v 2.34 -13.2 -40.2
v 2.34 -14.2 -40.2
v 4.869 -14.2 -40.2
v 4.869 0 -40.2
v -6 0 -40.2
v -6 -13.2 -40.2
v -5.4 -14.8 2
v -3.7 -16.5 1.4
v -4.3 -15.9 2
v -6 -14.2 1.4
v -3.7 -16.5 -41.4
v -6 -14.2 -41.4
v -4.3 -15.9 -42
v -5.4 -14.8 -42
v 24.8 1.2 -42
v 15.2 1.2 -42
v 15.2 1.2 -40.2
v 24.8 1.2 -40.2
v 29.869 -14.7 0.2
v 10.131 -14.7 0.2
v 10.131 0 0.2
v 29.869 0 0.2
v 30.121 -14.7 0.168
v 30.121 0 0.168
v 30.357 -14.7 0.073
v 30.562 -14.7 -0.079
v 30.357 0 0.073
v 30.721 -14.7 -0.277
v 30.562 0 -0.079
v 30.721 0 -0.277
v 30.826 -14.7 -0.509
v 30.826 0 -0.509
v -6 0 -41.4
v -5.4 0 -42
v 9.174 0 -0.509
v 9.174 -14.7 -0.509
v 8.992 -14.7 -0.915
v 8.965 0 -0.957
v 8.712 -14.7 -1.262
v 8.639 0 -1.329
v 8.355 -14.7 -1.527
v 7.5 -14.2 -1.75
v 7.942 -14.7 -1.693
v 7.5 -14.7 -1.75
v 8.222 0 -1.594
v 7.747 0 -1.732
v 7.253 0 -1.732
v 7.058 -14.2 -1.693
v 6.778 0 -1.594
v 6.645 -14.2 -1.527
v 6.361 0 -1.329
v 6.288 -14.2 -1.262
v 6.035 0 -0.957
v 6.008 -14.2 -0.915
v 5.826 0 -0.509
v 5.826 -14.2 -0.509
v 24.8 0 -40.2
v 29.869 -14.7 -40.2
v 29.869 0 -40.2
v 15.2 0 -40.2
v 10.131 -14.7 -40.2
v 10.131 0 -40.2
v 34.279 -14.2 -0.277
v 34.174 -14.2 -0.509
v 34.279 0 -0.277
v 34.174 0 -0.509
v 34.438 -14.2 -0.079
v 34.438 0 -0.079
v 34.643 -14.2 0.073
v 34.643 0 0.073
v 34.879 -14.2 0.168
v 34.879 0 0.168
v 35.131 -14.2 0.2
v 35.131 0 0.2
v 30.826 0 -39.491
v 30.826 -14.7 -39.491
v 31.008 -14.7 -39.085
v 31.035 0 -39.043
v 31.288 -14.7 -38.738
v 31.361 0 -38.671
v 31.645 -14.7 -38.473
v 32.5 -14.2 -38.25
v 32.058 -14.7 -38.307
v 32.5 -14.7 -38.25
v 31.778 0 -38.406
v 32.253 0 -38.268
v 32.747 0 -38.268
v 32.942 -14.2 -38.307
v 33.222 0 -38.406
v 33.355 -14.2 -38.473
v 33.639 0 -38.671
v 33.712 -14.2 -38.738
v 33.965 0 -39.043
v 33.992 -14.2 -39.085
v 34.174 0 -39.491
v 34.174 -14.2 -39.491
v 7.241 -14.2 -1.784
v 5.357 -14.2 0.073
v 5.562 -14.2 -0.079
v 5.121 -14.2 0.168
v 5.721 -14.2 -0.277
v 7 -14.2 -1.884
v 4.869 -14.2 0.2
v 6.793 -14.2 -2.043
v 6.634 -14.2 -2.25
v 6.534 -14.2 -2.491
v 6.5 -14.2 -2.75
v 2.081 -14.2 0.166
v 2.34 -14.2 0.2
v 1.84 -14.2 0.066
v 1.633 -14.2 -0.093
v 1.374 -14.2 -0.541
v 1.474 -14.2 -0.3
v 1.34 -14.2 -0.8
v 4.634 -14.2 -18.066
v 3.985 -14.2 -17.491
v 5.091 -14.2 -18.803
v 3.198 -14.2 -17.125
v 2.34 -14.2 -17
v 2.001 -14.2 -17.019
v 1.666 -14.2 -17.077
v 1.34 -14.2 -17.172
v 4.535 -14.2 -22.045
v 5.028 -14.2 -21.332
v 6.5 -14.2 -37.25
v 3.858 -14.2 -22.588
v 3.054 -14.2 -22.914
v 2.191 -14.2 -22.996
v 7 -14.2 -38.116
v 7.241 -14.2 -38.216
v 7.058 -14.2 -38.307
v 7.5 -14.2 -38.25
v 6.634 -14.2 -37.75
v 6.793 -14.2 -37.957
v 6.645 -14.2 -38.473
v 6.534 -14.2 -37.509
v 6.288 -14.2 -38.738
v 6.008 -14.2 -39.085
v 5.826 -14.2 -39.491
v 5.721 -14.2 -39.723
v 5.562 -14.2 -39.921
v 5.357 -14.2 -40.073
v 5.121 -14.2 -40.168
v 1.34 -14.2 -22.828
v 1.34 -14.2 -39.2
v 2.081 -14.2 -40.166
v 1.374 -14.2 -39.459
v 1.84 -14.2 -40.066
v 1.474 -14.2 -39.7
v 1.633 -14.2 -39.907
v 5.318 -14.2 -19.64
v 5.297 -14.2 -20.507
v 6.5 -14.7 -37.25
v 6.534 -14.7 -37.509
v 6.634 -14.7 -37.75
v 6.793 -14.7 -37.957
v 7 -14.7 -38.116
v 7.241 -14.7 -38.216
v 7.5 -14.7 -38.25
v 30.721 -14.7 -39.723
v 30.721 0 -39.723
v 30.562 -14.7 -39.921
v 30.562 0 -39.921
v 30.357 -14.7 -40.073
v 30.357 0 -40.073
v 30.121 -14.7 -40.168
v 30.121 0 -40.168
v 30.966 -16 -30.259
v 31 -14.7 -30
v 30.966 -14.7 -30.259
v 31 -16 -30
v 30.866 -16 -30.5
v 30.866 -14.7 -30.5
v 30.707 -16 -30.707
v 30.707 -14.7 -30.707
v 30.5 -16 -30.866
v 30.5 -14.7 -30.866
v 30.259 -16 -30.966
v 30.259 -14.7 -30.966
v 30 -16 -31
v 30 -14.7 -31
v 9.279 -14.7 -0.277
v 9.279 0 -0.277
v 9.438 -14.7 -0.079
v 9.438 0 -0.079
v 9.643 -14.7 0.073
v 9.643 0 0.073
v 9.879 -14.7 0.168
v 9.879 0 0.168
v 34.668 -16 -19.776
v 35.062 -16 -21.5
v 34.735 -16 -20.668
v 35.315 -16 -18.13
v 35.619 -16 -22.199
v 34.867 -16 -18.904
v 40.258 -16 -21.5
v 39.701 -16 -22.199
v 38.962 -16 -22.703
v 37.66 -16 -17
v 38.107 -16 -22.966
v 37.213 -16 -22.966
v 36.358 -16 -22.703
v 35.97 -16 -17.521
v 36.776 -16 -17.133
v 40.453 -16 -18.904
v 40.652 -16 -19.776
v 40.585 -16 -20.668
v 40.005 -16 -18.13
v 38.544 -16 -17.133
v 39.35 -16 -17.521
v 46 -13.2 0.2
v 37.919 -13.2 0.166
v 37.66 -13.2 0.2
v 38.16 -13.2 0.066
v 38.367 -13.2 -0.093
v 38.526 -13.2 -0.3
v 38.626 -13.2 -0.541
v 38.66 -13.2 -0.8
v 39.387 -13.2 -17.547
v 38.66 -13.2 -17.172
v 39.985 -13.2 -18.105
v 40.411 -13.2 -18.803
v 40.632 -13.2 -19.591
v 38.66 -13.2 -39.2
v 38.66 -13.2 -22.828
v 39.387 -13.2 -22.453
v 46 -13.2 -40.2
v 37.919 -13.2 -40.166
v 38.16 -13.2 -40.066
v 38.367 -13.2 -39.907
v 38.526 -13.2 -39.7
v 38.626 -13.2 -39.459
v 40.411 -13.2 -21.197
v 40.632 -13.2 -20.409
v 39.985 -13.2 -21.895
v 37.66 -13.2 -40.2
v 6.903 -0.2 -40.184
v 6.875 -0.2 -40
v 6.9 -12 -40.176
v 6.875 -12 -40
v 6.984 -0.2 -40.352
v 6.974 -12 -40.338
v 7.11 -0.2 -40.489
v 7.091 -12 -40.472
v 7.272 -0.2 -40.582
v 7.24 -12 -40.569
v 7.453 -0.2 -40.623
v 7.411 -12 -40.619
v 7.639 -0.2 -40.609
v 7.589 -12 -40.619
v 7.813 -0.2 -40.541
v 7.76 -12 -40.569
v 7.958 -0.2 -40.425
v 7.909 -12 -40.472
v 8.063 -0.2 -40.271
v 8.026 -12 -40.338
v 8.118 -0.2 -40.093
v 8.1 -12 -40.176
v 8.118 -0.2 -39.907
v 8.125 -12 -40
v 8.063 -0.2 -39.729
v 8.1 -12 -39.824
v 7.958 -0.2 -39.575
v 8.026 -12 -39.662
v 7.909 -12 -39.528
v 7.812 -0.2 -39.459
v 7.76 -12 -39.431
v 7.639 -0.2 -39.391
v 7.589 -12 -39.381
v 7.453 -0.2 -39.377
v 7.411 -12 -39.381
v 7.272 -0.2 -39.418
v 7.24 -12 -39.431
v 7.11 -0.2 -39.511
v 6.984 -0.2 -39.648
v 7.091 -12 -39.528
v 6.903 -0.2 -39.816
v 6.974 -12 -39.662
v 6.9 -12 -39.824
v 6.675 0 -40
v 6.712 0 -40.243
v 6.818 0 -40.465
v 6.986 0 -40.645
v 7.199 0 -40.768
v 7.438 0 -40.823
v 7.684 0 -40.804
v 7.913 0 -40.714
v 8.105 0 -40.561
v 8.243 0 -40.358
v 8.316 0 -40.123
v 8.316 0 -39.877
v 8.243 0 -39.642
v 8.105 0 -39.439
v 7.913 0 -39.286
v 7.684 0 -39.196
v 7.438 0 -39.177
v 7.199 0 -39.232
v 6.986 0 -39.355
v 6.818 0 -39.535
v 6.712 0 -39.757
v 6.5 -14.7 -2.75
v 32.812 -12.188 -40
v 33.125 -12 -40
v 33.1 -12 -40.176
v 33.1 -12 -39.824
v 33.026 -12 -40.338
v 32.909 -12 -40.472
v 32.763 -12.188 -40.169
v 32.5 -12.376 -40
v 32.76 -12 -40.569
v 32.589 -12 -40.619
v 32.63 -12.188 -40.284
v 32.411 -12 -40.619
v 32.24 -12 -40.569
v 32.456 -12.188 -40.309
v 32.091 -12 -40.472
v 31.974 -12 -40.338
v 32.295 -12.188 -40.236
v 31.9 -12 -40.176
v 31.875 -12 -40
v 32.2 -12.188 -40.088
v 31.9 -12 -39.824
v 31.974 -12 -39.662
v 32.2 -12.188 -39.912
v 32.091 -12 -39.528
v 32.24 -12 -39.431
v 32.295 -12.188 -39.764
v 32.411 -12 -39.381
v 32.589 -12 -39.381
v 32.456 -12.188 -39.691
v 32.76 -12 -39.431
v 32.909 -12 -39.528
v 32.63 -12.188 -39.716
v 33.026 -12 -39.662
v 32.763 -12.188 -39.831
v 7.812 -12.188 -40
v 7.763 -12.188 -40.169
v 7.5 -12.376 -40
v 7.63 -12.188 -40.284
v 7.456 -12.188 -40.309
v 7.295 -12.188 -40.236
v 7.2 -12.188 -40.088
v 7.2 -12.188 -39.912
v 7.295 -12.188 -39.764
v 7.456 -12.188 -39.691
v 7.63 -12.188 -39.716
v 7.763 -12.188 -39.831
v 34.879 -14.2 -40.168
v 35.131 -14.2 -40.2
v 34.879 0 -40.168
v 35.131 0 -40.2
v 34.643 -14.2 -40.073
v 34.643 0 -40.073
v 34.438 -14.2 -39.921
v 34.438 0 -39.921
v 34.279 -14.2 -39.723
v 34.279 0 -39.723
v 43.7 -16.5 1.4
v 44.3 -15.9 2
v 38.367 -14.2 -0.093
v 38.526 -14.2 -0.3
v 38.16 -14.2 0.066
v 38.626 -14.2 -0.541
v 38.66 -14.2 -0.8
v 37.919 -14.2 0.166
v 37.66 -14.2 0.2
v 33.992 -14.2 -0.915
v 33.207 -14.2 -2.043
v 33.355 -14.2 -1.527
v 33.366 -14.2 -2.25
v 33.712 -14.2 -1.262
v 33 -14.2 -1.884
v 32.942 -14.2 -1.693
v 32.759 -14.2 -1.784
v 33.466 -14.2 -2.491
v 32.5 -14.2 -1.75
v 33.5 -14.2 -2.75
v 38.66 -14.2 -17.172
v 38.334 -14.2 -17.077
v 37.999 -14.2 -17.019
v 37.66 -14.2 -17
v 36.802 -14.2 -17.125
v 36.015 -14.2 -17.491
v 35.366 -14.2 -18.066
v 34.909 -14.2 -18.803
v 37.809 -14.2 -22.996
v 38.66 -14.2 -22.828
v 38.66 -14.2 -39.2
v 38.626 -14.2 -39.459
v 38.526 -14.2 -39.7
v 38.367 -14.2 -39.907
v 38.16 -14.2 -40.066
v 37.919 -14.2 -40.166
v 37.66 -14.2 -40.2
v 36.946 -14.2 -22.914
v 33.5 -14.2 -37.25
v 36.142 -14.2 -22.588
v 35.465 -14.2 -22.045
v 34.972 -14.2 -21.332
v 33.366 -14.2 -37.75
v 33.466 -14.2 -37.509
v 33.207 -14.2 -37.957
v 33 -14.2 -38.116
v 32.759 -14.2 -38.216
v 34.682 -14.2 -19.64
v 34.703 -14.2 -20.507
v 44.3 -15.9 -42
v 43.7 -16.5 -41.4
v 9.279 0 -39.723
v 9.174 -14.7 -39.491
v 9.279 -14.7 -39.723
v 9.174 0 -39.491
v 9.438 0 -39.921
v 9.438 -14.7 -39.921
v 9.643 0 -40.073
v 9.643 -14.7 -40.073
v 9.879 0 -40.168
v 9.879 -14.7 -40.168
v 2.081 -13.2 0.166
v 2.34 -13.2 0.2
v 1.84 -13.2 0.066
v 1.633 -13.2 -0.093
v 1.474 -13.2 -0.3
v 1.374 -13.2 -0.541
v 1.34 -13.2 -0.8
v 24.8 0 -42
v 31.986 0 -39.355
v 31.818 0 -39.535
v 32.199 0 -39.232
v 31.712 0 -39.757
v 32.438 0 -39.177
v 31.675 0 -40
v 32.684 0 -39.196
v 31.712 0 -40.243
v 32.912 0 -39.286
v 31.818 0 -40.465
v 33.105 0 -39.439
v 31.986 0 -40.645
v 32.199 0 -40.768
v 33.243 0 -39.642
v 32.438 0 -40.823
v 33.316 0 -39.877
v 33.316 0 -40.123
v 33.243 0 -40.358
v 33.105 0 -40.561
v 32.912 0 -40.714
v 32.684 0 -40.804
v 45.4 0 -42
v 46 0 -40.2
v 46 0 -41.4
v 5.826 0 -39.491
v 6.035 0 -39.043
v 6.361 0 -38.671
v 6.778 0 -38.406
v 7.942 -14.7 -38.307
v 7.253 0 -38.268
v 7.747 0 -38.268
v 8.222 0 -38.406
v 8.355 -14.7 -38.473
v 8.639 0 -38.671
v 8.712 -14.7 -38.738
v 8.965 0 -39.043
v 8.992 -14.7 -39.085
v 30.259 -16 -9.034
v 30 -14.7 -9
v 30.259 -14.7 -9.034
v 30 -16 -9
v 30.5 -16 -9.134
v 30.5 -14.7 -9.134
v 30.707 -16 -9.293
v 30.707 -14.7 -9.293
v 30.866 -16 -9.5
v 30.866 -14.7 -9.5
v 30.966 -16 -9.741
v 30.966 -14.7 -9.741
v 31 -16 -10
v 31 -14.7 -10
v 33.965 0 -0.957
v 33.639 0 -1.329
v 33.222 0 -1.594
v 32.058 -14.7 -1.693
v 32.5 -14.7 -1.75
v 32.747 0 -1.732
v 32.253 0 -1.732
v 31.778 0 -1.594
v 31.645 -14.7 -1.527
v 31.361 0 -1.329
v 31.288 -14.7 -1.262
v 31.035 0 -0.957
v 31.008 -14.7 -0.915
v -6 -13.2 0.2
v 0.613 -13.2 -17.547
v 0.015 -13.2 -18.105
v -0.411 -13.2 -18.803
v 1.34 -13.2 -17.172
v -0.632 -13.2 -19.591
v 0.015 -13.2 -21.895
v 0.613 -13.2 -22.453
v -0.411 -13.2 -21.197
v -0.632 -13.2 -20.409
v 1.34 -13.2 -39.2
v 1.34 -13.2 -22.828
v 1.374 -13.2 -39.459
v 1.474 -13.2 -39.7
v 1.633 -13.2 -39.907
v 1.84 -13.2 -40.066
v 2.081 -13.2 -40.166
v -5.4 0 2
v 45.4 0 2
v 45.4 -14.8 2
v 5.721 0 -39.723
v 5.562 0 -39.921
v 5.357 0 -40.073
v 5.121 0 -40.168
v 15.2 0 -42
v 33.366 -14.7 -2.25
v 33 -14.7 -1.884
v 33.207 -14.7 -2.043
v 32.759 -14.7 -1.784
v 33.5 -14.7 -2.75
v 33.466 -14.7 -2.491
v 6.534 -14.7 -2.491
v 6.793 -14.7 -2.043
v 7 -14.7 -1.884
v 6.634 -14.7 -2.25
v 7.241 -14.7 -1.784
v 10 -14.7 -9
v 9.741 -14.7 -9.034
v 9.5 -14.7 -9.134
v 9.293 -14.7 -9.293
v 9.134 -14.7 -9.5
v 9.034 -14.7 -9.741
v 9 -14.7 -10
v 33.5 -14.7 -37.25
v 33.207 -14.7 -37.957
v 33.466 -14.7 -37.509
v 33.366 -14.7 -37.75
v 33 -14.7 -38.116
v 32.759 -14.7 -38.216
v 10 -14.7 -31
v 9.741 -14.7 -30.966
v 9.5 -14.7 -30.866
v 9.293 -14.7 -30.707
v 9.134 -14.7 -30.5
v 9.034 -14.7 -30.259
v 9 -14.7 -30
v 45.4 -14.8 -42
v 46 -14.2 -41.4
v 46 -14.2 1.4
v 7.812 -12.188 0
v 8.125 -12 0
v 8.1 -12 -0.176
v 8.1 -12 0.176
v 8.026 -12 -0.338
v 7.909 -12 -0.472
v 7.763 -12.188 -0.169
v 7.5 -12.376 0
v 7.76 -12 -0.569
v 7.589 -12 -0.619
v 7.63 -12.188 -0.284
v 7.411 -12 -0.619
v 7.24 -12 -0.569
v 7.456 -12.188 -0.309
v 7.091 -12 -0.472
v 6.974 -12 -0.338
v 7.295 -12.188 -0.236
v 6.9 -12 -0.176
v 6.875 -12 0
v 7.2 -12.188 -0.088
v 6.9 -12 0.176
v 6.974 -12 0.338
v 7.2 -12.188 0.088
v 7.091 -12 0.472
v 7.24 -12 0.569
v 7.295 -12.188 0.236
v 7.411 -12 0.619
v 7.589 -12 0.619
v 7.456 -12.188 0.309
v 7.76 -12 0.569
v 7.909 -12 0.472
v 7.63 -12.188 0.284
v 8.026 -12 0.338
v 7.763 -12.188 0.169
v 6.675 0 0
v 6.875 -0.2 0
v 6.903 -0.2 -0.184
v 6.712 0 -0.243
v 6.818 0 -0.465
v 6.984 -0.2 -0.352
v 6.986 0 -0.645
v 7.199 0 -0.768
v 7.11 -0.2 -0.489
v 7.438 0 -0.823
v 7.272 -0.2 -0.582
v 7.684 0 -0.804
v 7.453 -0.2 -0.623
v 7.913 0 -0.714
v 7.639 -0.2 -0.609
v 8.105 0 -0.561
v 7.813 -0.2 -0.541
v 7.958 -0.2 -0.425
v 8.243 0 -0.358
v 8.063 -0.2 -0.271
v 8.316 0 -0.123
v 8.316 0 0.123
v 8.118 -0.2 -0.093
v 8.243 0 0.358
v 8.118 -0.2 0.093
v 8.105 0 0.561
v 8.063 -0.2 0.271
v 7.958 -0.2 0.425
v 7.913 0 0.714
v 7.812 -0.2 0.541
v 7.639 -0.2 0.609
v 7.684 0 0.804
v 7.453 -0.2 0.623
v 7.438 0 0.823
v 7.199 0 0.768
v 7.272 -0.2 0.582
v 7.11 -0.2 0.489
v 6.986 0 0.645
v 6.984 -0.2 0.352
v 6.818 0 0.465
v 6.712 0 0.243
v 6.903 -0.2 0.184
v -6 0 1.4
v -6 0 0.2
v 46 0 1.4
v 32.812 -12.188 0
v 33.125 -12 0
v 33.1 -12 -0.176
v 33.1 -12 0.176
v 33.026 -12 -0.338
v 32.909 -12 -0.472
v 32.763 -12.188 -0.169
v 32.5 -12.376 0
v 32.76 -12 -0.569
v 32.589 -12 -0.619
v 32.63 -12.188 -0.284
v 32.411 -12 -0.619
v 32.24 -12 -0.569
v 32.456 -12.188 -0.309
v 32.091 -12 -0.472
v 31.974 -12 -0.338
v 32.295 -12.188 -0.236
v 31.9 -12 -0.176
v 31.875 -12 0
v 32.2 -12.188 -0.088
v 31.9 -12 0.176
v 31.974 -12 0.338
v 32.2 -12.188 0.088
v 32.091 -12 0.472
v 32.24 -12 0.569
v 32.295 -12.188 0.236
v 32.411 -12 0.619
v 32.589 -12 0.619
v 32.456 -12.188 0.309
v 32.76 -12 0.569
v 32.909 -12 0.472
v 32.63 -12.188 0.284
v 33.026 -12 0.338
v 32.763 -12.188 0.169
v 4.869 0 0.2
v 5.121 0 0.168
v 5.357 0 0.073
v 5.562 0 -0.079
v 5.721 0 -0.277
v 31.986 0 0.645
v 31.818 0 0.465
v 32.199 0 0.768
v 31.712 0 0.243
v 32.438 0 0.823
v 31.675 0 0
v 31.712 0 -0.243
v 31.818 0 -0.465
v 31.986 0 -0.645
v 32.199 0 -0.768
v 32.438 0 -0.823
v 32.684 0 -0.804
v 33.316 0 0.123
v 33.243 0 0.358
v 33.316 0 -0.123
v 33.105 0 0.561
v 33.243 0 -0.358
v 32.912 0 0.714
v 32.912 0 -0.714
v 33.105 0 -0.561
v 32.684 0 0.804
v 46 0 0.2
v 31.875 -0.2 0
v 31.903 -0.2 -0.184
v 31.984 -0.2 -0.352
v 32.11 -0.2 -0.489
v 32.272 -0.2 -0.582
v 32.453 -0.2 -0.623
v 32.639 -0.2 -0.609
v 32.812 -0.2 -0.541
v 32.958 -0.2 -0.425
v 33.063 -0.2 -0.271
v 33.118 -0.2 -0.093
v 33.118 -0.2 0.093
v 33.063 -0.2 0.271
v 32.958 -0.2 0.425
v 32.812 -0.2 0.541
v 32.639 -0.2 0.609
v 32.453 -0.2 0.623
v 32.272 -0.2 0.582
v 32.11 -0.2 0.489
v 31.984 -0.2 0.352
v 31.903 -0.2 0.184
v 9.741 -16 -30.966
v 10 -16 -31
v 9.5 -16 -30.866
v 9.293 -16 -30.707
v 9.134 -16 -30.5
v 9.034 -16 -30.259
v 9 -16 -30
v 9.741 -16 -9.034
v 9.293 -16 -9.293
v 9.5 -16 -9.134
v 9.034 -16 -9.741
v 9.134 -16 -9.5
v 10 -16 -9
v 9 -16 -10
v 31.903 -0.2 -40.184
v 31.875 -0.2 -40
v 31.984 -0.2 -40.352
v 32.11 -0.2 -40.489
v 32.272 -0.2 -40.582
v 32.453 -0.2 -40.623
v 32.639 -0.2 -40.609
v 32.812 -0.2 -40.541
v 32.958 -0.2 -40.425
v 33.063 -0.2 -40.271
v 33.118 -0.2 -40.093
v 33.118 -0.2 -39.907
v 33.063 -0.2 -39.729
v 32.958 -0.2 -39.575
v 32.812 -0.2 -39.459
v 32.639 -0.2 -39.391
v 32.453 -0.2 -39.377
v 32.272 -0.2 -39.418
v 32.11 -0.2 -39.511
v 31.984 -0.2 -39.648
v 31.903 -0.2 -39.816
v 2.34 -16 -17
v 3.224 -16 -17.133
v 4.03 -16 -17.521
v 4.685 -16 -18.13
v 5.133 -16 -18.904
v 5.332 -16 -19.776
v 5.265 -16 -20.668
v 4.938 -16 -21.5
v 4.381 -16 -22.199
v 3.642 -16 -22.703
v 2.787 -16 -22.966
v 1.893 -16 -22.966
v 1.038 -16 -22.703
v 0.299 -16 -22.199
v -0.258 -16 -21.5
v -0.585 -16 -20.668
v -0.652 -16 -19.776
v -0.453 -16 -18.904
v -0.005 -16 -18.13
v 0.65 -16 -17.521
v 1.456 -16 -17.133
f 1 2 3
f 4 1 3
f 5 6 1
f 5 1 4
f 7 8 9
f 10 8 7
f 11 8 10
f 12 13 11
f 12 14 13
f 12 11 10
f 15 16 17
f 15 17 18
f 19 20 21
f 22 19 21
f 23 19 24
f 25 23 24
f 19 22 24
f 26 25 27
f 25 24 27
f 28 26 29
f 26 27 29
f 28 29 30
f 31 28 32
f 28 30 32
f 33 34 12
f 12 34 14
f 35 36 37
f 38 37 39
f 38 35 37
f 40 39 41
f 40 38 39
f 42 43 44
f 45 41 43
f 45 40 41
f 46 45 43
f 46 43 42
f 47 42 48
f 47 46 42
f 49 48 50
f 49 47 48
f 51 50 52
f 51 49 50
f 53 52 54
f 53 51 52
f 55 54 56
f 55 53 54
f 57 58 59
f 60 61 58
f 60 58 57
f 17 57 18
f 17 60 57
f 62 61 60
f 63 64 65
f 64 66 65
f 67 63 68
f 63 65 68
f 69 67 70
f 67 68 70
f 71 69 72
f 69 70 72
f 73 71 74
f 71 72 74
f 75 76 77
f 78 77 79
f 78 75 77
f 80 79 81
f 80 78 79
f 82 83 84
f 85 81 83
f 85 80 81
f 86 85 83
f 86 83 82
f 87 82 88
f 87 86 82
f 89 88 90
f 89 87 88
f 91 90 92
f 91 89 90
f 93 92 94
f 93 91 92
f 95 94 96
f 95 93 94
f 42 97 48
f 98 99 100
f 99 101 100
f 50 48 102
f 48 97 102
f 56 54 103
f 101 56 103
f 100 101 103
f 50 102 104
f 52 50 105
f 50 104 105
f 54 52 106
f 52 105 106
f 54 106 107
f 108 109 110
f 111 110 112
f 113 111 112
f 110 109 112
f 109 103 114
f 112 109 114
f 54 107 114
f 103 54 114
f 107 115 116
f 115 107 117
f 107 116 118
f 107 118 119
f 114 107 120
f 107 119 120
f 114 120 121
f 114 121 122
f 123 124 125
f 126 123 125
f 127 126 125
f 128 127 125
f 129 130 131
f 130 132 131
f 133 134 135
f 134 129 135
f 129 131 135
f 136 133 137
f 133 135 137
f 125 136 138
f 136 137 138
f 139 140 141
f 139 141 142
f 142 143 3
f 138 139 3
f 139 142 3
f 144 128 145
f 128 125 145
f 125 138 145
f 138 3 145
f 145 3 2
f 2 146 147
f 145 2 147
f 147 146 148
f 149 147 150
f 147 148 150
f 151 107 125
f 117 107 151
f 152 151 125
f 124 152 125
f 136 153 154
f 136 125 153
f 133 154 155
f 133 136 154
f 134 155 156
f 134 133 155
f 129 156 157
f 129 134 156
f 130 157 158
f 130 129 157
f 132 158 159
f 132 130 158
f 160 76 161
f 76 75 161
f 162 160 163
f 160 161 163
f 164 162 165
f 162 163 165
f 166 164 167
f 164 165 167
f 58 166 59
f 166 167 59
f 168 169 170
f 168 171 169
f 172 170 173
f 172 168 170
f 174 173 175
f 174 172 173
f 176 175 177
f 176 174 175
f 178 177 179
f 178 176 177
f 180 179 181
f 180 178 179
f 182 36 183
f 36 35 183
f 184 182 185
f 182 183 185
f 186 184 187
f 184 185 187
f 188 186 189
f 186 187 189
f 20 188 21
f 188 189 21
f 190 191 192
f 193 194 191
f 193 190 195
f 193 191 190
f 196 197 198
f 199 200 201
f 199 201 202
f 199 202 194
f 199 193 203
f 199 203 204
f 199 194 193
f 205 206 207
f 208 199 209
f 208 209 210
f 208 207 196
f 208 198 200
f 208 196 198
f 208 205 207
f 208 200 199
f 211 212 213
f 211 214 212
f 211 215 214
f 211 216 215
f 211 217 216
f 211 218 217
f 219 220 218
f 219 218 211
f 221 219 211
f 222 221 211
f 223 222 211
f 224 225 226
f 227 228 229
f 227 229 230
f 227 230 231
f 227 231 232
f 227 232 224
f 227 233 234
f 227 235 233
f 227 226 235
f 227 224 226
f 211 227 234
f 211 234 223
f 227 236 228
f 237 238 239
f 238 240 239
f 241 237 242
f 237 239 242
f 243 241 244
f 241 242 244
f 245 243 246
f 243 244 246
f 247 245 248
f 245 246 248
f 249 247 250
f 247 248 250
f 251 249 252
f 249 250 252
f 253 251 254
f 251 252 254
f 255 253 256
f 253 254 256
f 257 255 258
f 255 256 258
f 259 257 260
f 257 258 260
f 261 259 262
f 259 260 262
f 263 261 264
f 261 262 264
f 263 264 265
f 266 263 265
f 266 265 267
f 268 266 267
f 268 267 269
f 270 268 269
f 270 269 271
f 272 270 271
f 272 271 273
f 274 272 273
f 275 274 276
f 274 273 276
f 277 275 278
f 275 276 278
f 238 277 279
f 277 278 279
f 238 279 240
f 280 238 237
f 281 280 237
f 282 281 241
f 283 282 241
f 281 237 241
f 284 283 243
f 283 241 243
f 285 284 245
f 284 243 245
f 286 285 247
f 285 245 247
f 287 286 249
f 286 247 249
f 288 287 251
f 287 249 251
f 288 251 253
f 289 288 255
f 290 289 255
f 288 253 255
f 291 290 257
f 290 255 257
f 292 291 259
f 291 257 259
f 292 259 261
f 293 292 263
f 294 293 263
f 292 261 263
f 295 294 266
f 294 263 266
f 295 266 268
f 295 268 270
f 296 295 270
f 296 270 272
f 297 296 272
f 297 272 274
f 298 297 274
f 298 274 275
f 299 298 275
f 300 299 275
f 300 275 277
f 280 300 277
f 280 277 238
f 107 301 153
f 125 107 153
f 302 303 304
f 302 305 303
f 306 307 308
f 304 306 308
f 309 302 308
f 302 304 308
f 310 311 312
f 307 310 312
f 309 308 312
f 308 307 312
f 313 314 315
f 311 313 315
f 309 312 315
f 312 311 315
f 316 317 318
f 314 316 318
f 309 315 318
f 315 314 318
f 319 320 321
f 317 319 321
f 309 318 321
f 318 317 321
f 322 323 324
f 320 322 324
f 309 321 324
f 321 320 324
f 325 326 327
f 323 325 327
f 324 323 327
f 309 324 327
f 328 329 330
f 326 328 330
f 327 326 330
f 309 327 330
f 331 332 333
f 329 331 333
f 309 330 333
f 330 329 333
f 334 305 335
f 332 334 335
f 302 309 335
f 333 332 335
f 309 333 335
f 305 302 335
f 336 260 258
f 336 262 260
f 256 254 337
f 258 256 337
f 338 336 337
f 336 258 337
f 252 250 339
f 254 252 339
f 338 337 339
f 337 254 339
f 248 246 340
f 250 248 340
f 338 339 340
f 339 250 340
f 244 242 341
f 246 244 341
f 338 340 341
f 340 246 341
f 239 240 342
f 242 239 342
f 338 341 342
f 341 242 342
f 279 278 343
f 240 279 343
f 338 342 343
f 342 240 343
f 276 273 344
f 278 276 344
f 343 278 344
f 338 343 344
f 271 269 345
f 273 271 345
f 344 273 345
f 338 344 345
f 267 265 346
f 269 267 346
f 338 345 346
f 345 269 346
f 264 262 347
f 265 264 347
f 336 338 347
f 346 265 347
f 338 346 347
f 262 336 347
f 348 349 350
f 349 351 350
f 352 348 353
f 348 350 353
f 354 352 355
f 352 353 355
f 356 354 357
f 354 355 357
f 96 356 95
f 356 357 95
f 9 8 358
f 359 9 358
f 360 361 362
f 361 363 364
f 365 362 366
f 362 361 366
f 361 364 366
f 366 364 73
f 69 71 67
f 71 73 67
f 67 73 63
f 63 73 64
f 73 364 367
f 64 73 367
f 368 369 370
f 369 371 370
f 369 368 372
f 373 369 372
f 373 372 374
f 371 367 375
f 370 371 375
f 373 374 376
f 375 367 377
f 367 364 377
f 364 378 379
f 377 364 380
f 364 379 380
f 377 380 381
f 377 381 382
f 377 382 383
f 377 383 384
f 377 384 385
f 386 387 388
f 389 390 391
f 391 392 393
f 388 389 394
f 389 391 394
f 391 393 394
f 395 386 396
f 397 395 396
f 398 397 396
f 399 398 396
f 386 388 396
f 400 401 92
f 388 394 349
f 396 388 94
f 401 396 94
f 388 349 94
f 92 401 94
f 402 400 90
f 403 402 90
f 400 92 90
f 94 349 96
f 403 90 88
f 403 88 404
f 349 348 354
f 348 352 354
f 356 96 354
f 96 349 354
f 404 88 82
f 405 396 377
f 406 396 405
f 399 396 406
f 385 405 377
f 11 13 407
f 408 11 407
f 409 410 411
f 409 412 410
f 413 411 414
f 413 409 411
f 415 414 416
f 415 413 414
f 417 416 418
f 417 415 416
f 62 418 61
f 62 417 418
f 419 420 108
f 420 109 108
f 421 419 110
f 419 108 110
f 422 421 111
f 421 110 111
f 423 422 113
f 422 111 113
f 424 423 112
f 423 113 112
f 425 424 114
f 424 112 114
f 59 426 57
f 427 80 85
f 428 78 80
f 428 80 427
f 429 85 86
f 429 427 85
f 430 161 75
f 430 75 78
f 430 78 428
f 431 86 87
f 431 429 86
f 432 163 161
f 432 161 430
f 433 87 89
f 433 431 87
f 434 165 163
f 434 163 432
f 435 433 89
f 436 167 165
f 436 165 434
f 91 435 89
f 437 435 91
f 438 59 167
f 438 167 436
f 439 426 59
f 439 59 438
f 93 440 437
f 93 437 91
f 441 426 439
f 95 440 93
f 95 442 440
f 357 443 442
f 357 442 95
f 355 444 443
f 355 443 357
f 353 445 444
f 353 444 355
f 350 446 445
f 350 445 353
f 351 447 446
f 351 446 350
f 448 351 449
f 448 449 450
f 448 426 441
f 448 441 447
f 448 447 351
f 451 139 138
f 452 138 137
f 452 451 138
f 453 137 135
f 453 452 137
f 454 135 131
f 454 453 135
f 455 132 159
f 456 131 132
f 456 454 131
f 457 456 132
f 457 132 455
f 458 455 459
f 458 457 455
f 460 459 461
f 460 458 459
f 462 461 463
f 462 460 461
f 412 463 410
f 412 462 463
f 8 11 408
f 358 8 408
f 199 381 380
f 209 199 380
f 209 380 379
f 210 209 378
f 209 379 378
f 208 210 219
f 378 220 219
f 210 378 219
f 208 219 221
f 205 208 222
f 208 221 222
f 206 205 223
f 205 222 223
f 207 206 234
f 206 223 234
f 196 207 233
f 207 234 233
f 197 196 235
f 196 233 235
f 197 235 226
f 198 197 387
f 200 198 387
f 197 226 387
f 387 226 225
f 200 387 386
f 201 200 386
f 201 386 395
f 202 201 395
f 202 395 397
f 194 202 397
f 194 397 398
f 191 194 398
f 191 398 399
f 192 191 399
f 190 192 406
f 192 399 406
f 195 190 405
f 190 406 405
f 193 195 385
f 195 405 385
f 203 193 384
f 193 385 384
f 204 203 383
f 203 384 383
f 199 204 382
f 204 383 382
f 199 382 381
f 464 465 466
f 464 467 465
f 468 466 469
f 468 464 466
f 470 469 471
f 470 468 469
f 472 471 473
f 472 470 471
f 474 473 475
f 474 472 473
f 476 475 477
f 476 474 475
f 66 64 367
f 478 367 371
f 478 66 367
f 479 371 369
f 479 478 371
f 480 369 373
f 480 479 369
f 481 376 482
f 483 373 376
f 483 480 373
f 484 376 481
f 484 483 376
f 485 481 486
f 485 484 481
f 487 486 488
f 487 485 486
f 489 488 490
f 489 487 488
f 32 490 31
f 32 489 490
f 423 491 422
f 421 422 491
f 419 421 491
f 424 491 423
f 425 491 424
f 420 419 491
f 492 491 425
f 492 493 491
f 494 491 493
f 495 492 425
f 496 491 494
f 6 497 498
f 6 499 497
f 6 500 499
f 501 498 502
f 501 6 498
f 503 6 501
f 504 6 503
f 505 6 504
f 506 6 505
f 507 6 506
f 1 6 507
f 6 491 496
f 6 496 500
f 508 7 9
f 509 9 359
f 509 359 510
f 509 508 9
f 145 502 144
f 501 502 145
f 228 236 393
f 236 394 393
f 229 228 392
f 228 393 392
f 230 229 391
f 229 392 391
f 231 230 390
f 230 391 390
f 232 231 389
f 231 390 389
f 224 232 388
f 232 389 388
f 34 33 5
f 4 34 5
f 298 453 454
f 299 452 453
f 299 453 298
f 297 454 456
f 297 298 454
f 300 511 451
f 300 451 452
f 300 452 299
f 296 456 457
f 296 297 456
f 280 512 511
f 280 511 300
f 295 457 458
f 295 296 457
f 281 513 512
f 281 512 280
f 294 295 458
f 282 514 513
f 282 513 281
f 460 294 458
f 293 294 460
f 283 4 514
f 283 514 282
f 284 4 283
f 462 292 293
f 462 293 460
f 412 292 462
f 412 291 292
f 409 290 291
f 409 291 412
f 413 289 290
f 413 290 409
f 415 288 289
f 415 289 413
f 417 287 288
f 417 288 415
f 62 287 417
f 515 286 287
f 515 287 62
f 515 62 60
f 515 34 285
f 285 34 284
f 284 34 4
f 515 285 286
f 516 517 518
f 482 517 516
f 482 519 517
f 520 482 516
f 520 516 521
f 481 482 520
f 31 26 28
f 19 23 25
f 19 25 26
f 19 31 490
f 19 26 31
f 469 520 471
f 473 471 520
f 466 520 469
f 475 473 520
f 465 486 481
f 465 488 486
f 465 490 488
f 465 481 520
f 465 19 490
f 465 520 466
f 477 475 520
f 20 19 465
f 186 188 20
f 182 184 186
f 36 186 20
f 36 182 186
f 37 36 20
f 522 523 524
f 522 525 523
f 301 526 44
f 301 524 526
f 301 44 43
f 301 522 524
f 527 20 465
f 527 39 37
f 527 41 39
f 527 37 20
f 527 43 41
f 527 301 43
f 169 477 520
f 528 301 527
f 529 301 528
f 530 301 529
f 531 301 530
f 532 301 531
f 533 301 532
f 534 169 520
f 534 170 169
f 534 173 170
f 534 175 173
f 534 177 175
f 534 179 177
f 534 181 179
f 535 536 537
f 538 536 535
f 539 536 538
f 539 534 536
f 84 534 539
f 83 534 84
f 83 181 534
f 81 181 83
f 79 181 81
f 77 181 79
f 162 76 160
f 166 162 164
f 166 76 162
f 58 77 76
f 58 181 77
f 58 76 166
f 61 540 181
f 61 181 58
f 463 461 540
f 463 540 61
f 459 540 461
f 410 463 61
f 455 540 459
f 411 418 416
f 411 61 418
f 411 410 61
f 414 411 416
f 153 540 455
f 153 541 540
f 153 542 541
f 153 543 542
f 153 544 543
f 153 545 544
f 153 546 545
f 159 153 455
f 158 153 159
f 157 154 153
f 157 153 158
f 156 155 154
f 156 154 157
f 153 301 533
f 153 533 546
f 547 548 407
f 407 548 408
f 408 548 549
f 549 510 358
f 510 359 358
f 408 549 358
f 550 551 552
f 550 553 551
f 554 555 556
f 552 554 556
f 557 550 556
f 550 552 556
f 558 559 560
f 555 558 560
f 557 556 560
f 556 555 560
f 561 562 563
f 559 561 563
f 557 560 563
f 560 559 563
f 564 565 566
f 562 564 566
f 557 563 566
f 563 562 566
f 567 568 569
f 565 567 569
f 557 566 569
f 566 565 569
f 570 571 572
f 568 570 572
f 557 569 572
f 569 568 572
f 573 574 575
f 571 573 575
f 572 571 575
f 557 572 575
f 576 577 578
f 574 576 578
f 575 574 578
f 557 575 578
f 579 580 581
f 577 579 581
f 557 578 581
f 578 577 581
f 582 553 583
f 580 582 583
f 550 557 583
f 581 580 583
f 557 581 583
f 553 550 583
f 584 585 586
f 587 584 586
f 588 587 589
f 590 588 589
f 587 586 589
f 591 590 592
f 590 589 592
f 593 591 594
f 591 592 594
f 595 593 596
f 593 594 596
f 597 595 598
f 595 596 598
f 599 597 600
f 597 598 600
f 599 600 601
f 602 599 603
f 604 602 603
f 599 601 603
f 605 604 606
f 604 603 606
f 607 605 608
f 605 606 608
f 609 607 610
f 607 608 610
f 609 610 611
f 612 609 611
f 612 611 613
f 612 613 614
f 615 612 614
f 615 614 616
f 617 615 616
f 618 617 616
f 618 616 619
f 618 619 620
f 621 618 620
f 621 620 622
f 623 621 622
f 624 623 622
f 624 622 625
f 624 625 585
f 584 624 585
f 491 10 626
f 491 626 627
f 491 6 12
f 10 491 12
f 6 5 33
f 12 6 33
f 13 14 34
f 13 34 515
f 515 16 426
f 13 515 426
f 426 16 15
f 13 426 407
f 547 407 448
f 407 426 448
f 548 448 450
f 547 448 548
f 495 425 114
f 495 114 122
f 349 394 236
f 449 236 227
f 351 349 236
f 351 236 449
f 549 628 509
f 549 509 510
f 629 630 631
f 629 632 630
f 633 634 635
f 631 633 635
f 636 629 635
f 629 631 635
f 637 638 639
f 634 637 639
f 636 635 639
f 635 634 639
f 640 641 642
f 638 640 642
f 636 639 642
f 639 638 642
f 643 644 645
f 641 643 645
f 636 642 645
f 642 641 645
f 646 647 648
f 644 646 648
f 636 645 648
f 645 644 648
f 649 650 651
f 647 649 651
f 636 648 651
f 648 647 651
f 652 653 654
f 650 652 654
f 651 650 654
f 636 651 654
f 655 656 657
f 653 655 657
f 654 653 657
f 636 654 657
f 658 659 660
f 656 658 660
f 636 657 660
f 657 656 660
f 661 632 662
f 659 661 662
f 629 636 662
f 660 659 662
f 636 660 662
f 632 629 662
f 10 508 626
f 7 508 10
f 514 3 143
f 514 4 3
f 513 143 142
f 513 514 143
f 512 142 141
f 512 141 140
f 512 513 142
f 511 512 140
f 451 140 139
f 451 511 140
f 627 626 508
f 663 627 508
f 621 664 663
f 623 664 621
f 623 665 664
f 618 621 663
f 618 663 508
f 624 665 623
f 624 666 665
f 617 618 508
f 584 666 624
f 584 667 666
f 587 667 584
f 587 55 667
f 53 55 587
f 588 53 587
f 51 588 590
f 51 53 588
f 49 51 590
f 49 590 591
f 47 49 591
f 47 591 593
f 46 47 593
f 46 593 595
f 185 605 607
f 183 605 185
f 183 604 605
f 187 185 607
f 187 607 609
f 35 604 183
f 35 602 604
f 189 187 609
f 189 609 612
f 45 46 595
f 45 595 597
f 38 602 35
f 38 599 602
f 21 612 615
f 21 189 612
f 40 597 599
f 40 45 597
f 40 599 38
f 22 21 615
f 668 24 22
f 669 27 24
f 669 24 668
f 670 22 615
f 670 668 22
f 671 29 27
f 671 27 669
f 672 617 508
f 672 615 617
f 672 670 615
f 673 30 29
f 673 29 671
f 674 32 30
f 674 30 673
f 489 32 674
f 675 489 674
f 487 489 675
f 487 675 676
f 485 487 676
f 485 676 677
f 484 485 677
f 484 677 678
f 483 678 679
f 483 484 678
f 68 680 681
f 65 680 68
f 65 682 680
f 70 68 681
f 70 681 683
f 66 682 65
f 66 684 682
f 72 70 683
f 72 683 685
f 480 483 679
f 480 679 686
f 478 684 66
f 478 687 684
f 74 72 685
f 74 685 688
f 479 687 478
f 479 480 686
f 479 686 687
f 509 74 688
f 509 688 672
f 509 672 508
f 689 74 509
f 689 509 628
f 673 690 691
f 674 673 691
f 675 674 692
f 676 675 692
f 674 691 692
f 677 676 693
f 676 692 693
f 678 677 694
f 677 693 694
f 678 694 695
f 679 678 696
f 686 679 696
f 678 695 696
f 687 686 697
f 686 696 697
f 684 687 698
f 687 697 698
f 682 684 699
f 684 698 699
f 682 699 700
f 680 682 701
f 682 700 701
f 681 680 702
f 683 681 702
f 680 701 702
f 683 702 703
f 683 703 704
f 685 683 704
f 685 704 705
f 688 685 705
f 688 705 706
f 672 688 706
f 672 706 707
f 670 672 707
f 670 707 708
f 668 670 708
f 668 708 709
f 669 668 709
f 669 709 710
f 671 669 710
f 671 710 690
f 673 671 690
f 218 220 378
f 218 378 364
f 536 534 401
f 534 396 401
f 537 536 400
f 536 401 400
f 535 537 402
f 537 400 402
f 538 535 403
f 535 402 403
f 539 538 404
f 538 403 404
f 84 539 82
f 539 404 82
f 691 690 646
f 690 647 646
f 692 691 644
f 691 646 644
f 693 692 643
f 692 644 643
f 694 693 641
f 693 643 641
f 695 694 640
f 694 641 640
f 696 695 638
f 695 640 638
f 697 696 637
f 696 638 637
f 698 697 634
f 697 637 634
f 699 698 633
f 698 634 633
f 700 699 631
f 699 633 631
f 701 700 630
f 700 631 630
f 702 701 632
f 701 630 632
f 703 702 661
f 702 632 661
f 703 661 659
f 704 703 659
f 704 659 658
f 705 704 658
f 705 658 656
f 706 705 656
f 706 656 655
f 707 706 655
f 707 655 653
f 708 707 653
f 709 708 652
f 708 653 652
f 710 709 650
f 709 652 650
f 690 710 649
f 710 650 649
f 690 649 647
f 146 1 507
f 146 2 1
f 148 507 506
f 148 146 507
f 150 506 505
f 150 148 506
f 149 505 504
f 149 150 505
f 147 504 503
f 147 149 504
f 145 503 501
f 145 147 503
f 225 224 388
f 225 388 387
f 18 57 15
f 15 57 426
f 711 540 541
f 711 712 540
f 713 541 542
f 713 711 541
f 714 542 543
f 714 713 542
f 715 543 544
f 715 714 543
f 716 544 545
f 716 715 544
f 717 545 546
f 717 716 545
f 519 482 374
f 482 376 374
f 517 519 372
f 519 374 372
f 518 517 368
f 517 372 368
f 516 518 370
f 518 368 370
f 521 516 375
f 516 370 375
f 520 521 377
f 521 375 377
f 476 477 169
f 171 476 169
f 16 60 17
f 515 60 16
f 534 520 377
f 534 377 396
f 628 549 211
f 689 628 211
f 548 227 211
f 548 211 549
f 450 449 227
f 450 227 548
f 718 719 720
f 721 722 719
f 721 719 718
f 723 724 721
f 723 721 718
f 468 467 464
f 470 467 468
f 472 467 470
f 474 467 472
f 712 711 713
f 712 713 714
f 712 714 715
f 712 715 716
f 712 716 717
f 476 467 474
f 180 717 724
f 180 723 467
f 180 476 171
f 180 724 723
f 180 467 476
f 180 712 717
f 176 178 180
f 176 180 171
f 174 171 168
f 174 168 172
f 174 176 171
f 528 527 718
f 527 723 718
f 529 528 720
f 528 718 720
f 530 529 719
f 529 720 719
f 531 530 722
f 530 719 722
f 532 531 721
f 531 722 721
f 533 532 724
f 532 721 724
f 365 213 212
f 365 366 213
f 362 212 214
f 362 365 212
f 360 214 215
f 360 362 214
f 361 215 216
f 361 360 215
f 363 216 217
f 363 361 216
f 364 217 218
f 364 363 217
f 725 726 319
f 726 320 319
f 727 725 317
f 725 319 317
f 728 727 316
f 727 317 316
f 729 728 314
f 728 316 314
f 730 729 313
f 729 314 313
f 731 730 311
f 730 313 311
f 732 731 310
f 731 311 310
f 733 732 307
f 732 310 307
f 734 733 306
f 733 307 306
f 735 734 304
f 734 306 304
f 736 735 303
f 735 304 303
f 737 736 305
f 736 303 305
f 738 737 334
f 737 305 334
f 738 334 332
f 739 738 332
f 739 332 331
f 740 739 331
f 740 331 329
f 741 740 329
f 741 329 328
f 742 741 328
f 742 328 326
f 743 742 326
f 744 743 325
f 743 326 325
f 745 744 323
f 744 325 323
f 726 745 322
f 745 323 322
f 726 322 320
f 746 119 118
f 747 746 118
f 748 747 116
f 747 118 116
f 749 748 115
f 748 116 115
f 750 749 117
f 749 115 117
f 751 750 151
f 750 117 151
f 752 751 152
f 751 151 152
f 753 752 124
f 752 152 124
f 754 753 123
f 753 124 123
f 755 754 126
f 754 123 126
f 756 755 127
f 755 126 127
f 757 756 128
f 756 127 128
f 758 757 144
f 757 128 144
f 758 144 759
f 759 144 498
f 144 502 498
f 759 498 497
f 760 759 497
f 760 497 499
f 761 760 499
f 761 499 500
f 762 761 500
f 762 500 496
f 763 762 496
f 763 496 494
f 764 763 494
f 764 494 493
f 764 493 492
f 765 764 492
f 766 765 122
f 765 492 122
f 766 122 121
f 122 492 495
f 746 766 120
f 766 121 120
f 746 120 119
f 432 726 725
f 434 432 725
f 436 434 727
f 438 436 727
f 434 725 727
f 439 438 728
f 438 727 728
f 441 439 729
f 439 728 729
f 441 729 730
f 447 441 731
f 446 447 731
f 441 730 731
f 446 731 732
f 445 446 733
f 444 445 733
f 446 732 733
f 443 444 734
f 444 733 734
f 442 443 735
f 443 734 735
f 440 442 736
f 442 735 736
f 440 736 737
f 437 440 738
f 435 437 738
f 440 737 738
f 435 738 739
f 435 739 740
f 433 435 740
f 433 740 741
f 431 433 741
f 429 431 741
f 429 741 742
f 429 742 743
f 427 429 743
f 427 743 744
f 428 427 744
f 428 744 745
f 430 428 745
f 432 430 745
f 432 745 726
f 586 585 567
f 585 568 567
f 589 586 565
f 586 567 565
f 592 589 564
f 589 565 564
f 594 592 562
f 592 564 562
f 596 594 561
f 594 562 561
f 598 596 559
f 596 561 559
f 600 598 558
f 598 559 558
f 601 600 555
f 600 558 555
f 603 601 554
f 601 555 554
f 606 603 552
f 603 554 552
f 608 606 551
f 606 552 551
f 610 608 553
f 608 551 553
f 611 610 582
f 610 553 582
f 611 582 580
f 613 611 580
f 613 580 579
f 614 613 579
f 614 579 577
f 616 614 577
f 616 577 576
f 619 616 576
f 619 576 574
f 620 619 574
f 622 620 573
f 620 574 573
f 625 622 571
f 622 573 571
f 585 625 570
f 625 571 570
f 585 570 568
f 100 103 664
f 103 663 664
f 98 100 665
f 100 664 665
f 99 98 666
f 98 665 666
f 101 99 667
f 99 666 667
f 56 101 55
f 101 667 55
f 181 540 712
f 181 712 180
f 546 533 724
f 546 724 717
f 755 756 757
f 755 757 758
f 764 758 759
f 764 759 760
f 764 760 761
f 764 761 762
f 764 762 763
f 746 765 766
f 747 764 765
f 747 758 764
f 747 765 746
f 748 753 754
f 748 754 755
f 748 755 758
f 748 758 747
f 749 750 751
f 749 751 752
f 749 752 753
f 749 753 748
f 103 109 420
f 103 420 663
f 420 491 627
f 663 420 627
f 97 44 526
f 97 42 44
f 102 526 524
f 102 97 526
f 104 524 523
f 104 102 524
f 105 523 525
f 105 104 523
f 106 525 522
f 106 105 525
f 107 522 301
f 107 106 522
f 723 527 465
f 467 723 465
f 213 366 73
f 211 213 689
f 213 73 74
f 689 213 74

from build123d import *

# Parameters (mm, degrees)
SKETCH_1_W                     = 52
SKETCH_1_H                     = 44
EXTRUDE_1_DEPTH                = 16.5
SHELL_1_T                      = -1.8
CUT_EXTRUDE_1_DEPTH            = 68.500296296
CUT_EXTRUDE_1_DEPTH_BACK       = 68.500296296
SKETCH_3_W                     = 40.4
SKETCH_3_H                     = 14.7
SKETCH_4_W                     = 12.5
SKETCH_4_H                     = 40.4
EXTRUDE_2_DEPTH                = 1.5
CUT_EXTRUDE_2_DEPTH            = 1
EXTRUDE_3_REACH                = 66.438
SKETCH_6_R                     = 1.75
HOLE_WIZARD_M1_6_1_D           = 1.25
HOLE_WIZARD_M1_6_1_DEPTH       = 12
HOLE_WIZARD_M1_6_1_CSINK_D     = 1.65
HOLE_WIZARD_M1_6_1_CSINK_ANGLE = 90
HOLE_WIZARD_M1_6_1_TIP         = 0.375537887
SKETCH_11_W                    = 22
SKETCH_11_H                    = 22
CUT_EXTRUDE_3_DEPTH            = 1.3
CHAMFER_2_SIZE                 = 0.6
FILLET_1_R                     = 1
SKETCH_13_W                    = 9.6
SKETCH_13_H                    = 1.8
EXTRUDE_4_DEPTH                = 1.2
CHAMFER_3_SIZE                 = 2.3
SKETCH_14_R                    = 3
CUT_EXTRUDE_5_DEPTH            = 16


with BuildPart() as part:
    # 스케치1 → 보스-돌출1 (new body)
    with BuildSketch(Plane(origin=(0, 0, 0), x_dir=(1, 0, 0), z_dir=(0, 1, 0))):
        with Locations((20, 20)):
            Rectangle(SKETCH_1_W, SKETCH_1_H)
    extrude(amount=-EXTRUDE_1_DEPTH)

    # 쉘1
    shell_1_openings = [part.faces().sort_by_distance(p)[0] for p in [
        (20, 0, -20),
    ]]
    offset(amount=SHELL_1_T, openings=shell_1_openings, kind=Kind.INTERSECTION)

    # 스케치3 → 컷-돌출1 (cut, two sides: drawn at the far end of the back side and taken through both)
    with BuildSketch(Plane(origin=(-4.2, 0, 0), x_dir=(0, 0, -1), z_dir=(1, 0, 0)).offset(-CUT_EXTRUDE_1_DEPTH_BACK)):
        with Locations((20, -7.35)):
            Rectangle(SKETCH_3_W, SKETCH_3_H)
    extrude(amount=CUT_EXTRUDE_1_DEPTH + CUT_EXTRUDE_1_DEPTH_BACK, mode=Mode.SUBTRACT)

    # 스케치4 → 보스-돌출2 (add)
    with BuildSketch(Plane(origin=(0, -14.7, 0), x_dir=(1, 0, 0), z_dir=(0, 1, 0))):
        with Locations((39.75, 20)):
            Rectangle(SKETCH_4_W, SKETCH_4_H)
        with Locations((0.25, 20)):
            Rectangle(SKETCH_4_W, SKETCH_4_H)
    extrude(amount=EXTRUDE_2_DEPTH)

    # 스케치5 → 컷-돌출2 (cut)
    with BuildSketch(Plane(origin=(0, -13.2, 0), x_dir=(1, 0, 0), z_dir=(0, 1, 0))):
        Polygon((2.34, -0.2), (1.34, -0.2), (1.34, 40.2), (2.34, 40.2), (4.34, 40.2), (9.34, 40.2), (9.34, -0.2), (4.34, -0.2), align=None)
        Polygon((35.66, 40.2), (37.66, 40.2), (38.66, 40.2), (38.66, -0.2), (37.66, -0.2), (35.66, -0.2), (30.66, -0.2), (30.66, 40.2), align=None)
    extrude(amount=-CUT_EXTRUDE_2_DEPTH, mode=Mode.SUBTRACT)

    # 스케치6 → 보스-돌출3 (add, up to next)
    with BuildSketch(Plane(origin=(0, 0, 0), x_dir=(1, 0, 0), z_dir=(0, 1, 0)), mode=Mode.PRIVATE) as extrude_3_sk1:
        with Locations((7.5, 0)):
            Circle(SKETCH_6_R)
    extrude_3_tool1 = extrude(extrude_3_sk1.sketch, amount=-EXTRUDE_3_REACH, mode=Mode.PRIVATE) - part.part
    # 스케치6 → 보스-돌출3 (add, up to next)
    with BuildSketch(Plane(origin=(0, 0, 0), x_dir=(1, 0, 0), z_dir=(0, 1, 0)), mode=Mode.PRIVATE) as extrude_3_sk2:
        with Locations((7.5, 40)):
            Circle(SKETCH_6_R)
    extrude_3_tool2 = extrude(extrude_3_sk2.sketch, amount=-EXTRUDE_3_REACH, mode=Mode.PRIVATE) - part.part
    # 스케치6 → 보스-돌출3 (add, up to next)
    with BuildSketch(Plane(origin=(0, 0, 0), x_dir=(1, 0, 0), z_dir=(0, 1, 0)), mode=Mode.PRIVATE) as extrude_3_sk3:
        with Locations((32.5, 40)):
            Circle(SKETCH_6_R)
    extrude_3_tool3 = extrude(extrude_3_sk3.sketch, amount=-EXTRUDE_3_REACH, mode=Mode.PRIVATE) - part.part
    # 스케치6 → 보스-돌출3 (add, up to next)
    with BuildSketch(Plane(origin=(0, 0, 0), x_dir=(1, 0, 0), z_dir=(0, 1, 0)), mode=Mode.PRIVATE) as extrude_3_sk4:
        with Locations((32.5, 0)):
            Circle(SKETCH_6_R)
    extrude_3_tool4 = extrude(extrude_3_sk4.sketch, amount=-EXTRUDE_3_REACH, mode=Mode.PRIVATE) - part.part
    add(extrude_3_tool1.solids().sort_by_distance((7.5, 0, 0))[0])
    add(extrude_3_tool2.solids().sort_by_distance((7.5, 0, -40))[0])
    add(extrude_3_tool3.solids().sort_by_distance((32.5, 0, -40))[0])
    add(extrude_3_tool4.solids().sort_by_distance((32.5, 0, 0))[0])

    # M1.6 나사 구멍1
    with Locations(Plane(origin=(0, 0, 0), x_dir=(1, 0, 0), z_dir=(0, 1, 0))):
        with Locations((7.5, 0), (32.5, 0), (7.5, 40), (32.5, 40)):
            CounterSinkHole(HOLE_WIZARD_M1_6_1_D / 2, HOLE_WIZARD_M1_6_1_CSINK_D / 2, depth=HOLE_WIZARD_M1_6_1_DEPTH, counter_sink_angle=HOLE_WIZARD_M1_6_1_CSINK_ANGLE)
            with Locations((0, 0, -(HOLE_WIZARD_M1_6_1_DEPTH + HOLE_WIZARD_M1_6_1_TIP / 2))):  # 118° drill point
                Cone(0, HOLE_WIZARD_M1_6_1_D / 2, HOLE_WIZARD_M1_6_1_TIP, mode=Mode.SUBTRACT)

    # 스케치11 → 컷-돌출3 (cut)
    with BuildSketch(Plane(origin=(0, -14.7, 0), x_dir=(1, 0, 0), z_dir=(0, 1, 0))):
        with Locations((20, 20)):
            Rectangle(SKETCH_11_W, SKETCH_11_H)
    extrude(amount=-CUT_EXTRUDE_3_DEPTH, mode=Mode.SUBTRACT)

    # 모따기2
    chamfer_2_edges = [part.edges().sort_by_distance(p)[0] for p in [
        (20, -16.5, -42),
        (20, -16.5, 2),
        (-6, -8.25, -42),
        (46, -8.25, -42),
        (46, -8.25, 2),
        (-6, -8.25, 2),
    ]]
    chamfer(chamfer_2_edges, length=CHAMFER_2_SIZE)

    # 필렛1
    fillet_1_edges = [part.edges().sort_by_distance(p)[0] for p in [
        (38.66, -13.7, 0.2),
        (38.66, -13.7, -40.2),
        (9.238533865, -7.35, 0.2),
        (6.5, -14.45, -1.436140662),
        (5.761466135, -7.1, 0.2),
        (5.761466135, -7.1, -40.2),
        (6.5, -14.45, -38.563859338),
        (9.238533865, -7.35, -40.2),
        (30.761466135, -7.35, -40.2),
        (33.5, -14.45, -38.563859338),
        (34.238533865, -7.1, -40.2),
        (34.238533865, -7.1, 0.2),
        (33.5, -14.45, -1.436140662),
        (30.761466135, -7.35, 0.2),
        (9, -15.35, -9),
        (9, -15.35, -31),
        (31, -15.35, -31),
        (31, -15.35, -9),
        (1.34, -13.7, -40.2),
        (1.34, -13.7, 0.2),
    ]]
    fillet(fillet_1_edges, radius=FILLET_1_R)

    # 스케치13 → 보스-돌출4 (add)
    with BuildSketch(Plane(origin=(0, 0, 0), x_dir=(1, 0, 0), z_dir=(0, 1, 0))):
        with Locations((20, 41.1)):
            Rectangle(SKETCH_13_W, SKETCH_13_H)
    extrude(amount=EXTRUDE_4_DEPTH)

    # 모따기3
    # the kernel refuses this chamfer: 2.3 mm, written as the material it takes off along each edge
    with BuildSketch(Plane(origin=(46, -16.5, 7.314870872), x_dir=(0.027495876610586976, 0.9996219169112968, 0), z_dir=(0, 0, -1))) as chamfer_3_piece_1:
        Polygon((CHAMFER_3_SIZE * 0.999621916911, -CHAMFER_3_SIZE * 0.0274958766106), (-CHAMFER_3_SIZE * 0.0274958766106, -CHAMFER_3_SIZE * 0.999621916911), (0, 0), align=None)
    extrude(amount=54.629741745, mode=Mode.SUBTRACT)
    with BuildSketch(Plane(origin=(-6, -16.5, -47.314870872), x_dir=(0.9996219169112966, -0.027495876610586965, 0), z_dir=(0, 0, 1))) as chamfer_3_piece_2:
        Polygon((CHAMFER_3_SIZE * 0.999621916911, CHAMFER_3_SIZE * 0.0274958766106), (-CHAMFER_3_SIZE * 0.0274958766106, CHAMFER_3_SIZE * 0.999621916911), (0, 0), align=None)
    extrude(amount=54.629741745, mode=Mode.SUBTRACT)

    # 스케치14 → 컷-돌출5 (cut)
    with BuildSketch(Plane(origin=(0, 0, 0), x_dir=(1, 0, 0), z_dir=(0, 1, 0))):
        with Locations(Location((2.34, 20, 0), (0, 0, 270))):
            Circle(SKETCH_14_R)
        with Locations(Location((37.66, 20, 0), (0, 0, 270))):
            Circle(SKETCH_14_R)
    extrude(amount=-CUT_EXTRUDE_5_DEPTH, mode=Mode.SUBTRACT)


solid = part.part
